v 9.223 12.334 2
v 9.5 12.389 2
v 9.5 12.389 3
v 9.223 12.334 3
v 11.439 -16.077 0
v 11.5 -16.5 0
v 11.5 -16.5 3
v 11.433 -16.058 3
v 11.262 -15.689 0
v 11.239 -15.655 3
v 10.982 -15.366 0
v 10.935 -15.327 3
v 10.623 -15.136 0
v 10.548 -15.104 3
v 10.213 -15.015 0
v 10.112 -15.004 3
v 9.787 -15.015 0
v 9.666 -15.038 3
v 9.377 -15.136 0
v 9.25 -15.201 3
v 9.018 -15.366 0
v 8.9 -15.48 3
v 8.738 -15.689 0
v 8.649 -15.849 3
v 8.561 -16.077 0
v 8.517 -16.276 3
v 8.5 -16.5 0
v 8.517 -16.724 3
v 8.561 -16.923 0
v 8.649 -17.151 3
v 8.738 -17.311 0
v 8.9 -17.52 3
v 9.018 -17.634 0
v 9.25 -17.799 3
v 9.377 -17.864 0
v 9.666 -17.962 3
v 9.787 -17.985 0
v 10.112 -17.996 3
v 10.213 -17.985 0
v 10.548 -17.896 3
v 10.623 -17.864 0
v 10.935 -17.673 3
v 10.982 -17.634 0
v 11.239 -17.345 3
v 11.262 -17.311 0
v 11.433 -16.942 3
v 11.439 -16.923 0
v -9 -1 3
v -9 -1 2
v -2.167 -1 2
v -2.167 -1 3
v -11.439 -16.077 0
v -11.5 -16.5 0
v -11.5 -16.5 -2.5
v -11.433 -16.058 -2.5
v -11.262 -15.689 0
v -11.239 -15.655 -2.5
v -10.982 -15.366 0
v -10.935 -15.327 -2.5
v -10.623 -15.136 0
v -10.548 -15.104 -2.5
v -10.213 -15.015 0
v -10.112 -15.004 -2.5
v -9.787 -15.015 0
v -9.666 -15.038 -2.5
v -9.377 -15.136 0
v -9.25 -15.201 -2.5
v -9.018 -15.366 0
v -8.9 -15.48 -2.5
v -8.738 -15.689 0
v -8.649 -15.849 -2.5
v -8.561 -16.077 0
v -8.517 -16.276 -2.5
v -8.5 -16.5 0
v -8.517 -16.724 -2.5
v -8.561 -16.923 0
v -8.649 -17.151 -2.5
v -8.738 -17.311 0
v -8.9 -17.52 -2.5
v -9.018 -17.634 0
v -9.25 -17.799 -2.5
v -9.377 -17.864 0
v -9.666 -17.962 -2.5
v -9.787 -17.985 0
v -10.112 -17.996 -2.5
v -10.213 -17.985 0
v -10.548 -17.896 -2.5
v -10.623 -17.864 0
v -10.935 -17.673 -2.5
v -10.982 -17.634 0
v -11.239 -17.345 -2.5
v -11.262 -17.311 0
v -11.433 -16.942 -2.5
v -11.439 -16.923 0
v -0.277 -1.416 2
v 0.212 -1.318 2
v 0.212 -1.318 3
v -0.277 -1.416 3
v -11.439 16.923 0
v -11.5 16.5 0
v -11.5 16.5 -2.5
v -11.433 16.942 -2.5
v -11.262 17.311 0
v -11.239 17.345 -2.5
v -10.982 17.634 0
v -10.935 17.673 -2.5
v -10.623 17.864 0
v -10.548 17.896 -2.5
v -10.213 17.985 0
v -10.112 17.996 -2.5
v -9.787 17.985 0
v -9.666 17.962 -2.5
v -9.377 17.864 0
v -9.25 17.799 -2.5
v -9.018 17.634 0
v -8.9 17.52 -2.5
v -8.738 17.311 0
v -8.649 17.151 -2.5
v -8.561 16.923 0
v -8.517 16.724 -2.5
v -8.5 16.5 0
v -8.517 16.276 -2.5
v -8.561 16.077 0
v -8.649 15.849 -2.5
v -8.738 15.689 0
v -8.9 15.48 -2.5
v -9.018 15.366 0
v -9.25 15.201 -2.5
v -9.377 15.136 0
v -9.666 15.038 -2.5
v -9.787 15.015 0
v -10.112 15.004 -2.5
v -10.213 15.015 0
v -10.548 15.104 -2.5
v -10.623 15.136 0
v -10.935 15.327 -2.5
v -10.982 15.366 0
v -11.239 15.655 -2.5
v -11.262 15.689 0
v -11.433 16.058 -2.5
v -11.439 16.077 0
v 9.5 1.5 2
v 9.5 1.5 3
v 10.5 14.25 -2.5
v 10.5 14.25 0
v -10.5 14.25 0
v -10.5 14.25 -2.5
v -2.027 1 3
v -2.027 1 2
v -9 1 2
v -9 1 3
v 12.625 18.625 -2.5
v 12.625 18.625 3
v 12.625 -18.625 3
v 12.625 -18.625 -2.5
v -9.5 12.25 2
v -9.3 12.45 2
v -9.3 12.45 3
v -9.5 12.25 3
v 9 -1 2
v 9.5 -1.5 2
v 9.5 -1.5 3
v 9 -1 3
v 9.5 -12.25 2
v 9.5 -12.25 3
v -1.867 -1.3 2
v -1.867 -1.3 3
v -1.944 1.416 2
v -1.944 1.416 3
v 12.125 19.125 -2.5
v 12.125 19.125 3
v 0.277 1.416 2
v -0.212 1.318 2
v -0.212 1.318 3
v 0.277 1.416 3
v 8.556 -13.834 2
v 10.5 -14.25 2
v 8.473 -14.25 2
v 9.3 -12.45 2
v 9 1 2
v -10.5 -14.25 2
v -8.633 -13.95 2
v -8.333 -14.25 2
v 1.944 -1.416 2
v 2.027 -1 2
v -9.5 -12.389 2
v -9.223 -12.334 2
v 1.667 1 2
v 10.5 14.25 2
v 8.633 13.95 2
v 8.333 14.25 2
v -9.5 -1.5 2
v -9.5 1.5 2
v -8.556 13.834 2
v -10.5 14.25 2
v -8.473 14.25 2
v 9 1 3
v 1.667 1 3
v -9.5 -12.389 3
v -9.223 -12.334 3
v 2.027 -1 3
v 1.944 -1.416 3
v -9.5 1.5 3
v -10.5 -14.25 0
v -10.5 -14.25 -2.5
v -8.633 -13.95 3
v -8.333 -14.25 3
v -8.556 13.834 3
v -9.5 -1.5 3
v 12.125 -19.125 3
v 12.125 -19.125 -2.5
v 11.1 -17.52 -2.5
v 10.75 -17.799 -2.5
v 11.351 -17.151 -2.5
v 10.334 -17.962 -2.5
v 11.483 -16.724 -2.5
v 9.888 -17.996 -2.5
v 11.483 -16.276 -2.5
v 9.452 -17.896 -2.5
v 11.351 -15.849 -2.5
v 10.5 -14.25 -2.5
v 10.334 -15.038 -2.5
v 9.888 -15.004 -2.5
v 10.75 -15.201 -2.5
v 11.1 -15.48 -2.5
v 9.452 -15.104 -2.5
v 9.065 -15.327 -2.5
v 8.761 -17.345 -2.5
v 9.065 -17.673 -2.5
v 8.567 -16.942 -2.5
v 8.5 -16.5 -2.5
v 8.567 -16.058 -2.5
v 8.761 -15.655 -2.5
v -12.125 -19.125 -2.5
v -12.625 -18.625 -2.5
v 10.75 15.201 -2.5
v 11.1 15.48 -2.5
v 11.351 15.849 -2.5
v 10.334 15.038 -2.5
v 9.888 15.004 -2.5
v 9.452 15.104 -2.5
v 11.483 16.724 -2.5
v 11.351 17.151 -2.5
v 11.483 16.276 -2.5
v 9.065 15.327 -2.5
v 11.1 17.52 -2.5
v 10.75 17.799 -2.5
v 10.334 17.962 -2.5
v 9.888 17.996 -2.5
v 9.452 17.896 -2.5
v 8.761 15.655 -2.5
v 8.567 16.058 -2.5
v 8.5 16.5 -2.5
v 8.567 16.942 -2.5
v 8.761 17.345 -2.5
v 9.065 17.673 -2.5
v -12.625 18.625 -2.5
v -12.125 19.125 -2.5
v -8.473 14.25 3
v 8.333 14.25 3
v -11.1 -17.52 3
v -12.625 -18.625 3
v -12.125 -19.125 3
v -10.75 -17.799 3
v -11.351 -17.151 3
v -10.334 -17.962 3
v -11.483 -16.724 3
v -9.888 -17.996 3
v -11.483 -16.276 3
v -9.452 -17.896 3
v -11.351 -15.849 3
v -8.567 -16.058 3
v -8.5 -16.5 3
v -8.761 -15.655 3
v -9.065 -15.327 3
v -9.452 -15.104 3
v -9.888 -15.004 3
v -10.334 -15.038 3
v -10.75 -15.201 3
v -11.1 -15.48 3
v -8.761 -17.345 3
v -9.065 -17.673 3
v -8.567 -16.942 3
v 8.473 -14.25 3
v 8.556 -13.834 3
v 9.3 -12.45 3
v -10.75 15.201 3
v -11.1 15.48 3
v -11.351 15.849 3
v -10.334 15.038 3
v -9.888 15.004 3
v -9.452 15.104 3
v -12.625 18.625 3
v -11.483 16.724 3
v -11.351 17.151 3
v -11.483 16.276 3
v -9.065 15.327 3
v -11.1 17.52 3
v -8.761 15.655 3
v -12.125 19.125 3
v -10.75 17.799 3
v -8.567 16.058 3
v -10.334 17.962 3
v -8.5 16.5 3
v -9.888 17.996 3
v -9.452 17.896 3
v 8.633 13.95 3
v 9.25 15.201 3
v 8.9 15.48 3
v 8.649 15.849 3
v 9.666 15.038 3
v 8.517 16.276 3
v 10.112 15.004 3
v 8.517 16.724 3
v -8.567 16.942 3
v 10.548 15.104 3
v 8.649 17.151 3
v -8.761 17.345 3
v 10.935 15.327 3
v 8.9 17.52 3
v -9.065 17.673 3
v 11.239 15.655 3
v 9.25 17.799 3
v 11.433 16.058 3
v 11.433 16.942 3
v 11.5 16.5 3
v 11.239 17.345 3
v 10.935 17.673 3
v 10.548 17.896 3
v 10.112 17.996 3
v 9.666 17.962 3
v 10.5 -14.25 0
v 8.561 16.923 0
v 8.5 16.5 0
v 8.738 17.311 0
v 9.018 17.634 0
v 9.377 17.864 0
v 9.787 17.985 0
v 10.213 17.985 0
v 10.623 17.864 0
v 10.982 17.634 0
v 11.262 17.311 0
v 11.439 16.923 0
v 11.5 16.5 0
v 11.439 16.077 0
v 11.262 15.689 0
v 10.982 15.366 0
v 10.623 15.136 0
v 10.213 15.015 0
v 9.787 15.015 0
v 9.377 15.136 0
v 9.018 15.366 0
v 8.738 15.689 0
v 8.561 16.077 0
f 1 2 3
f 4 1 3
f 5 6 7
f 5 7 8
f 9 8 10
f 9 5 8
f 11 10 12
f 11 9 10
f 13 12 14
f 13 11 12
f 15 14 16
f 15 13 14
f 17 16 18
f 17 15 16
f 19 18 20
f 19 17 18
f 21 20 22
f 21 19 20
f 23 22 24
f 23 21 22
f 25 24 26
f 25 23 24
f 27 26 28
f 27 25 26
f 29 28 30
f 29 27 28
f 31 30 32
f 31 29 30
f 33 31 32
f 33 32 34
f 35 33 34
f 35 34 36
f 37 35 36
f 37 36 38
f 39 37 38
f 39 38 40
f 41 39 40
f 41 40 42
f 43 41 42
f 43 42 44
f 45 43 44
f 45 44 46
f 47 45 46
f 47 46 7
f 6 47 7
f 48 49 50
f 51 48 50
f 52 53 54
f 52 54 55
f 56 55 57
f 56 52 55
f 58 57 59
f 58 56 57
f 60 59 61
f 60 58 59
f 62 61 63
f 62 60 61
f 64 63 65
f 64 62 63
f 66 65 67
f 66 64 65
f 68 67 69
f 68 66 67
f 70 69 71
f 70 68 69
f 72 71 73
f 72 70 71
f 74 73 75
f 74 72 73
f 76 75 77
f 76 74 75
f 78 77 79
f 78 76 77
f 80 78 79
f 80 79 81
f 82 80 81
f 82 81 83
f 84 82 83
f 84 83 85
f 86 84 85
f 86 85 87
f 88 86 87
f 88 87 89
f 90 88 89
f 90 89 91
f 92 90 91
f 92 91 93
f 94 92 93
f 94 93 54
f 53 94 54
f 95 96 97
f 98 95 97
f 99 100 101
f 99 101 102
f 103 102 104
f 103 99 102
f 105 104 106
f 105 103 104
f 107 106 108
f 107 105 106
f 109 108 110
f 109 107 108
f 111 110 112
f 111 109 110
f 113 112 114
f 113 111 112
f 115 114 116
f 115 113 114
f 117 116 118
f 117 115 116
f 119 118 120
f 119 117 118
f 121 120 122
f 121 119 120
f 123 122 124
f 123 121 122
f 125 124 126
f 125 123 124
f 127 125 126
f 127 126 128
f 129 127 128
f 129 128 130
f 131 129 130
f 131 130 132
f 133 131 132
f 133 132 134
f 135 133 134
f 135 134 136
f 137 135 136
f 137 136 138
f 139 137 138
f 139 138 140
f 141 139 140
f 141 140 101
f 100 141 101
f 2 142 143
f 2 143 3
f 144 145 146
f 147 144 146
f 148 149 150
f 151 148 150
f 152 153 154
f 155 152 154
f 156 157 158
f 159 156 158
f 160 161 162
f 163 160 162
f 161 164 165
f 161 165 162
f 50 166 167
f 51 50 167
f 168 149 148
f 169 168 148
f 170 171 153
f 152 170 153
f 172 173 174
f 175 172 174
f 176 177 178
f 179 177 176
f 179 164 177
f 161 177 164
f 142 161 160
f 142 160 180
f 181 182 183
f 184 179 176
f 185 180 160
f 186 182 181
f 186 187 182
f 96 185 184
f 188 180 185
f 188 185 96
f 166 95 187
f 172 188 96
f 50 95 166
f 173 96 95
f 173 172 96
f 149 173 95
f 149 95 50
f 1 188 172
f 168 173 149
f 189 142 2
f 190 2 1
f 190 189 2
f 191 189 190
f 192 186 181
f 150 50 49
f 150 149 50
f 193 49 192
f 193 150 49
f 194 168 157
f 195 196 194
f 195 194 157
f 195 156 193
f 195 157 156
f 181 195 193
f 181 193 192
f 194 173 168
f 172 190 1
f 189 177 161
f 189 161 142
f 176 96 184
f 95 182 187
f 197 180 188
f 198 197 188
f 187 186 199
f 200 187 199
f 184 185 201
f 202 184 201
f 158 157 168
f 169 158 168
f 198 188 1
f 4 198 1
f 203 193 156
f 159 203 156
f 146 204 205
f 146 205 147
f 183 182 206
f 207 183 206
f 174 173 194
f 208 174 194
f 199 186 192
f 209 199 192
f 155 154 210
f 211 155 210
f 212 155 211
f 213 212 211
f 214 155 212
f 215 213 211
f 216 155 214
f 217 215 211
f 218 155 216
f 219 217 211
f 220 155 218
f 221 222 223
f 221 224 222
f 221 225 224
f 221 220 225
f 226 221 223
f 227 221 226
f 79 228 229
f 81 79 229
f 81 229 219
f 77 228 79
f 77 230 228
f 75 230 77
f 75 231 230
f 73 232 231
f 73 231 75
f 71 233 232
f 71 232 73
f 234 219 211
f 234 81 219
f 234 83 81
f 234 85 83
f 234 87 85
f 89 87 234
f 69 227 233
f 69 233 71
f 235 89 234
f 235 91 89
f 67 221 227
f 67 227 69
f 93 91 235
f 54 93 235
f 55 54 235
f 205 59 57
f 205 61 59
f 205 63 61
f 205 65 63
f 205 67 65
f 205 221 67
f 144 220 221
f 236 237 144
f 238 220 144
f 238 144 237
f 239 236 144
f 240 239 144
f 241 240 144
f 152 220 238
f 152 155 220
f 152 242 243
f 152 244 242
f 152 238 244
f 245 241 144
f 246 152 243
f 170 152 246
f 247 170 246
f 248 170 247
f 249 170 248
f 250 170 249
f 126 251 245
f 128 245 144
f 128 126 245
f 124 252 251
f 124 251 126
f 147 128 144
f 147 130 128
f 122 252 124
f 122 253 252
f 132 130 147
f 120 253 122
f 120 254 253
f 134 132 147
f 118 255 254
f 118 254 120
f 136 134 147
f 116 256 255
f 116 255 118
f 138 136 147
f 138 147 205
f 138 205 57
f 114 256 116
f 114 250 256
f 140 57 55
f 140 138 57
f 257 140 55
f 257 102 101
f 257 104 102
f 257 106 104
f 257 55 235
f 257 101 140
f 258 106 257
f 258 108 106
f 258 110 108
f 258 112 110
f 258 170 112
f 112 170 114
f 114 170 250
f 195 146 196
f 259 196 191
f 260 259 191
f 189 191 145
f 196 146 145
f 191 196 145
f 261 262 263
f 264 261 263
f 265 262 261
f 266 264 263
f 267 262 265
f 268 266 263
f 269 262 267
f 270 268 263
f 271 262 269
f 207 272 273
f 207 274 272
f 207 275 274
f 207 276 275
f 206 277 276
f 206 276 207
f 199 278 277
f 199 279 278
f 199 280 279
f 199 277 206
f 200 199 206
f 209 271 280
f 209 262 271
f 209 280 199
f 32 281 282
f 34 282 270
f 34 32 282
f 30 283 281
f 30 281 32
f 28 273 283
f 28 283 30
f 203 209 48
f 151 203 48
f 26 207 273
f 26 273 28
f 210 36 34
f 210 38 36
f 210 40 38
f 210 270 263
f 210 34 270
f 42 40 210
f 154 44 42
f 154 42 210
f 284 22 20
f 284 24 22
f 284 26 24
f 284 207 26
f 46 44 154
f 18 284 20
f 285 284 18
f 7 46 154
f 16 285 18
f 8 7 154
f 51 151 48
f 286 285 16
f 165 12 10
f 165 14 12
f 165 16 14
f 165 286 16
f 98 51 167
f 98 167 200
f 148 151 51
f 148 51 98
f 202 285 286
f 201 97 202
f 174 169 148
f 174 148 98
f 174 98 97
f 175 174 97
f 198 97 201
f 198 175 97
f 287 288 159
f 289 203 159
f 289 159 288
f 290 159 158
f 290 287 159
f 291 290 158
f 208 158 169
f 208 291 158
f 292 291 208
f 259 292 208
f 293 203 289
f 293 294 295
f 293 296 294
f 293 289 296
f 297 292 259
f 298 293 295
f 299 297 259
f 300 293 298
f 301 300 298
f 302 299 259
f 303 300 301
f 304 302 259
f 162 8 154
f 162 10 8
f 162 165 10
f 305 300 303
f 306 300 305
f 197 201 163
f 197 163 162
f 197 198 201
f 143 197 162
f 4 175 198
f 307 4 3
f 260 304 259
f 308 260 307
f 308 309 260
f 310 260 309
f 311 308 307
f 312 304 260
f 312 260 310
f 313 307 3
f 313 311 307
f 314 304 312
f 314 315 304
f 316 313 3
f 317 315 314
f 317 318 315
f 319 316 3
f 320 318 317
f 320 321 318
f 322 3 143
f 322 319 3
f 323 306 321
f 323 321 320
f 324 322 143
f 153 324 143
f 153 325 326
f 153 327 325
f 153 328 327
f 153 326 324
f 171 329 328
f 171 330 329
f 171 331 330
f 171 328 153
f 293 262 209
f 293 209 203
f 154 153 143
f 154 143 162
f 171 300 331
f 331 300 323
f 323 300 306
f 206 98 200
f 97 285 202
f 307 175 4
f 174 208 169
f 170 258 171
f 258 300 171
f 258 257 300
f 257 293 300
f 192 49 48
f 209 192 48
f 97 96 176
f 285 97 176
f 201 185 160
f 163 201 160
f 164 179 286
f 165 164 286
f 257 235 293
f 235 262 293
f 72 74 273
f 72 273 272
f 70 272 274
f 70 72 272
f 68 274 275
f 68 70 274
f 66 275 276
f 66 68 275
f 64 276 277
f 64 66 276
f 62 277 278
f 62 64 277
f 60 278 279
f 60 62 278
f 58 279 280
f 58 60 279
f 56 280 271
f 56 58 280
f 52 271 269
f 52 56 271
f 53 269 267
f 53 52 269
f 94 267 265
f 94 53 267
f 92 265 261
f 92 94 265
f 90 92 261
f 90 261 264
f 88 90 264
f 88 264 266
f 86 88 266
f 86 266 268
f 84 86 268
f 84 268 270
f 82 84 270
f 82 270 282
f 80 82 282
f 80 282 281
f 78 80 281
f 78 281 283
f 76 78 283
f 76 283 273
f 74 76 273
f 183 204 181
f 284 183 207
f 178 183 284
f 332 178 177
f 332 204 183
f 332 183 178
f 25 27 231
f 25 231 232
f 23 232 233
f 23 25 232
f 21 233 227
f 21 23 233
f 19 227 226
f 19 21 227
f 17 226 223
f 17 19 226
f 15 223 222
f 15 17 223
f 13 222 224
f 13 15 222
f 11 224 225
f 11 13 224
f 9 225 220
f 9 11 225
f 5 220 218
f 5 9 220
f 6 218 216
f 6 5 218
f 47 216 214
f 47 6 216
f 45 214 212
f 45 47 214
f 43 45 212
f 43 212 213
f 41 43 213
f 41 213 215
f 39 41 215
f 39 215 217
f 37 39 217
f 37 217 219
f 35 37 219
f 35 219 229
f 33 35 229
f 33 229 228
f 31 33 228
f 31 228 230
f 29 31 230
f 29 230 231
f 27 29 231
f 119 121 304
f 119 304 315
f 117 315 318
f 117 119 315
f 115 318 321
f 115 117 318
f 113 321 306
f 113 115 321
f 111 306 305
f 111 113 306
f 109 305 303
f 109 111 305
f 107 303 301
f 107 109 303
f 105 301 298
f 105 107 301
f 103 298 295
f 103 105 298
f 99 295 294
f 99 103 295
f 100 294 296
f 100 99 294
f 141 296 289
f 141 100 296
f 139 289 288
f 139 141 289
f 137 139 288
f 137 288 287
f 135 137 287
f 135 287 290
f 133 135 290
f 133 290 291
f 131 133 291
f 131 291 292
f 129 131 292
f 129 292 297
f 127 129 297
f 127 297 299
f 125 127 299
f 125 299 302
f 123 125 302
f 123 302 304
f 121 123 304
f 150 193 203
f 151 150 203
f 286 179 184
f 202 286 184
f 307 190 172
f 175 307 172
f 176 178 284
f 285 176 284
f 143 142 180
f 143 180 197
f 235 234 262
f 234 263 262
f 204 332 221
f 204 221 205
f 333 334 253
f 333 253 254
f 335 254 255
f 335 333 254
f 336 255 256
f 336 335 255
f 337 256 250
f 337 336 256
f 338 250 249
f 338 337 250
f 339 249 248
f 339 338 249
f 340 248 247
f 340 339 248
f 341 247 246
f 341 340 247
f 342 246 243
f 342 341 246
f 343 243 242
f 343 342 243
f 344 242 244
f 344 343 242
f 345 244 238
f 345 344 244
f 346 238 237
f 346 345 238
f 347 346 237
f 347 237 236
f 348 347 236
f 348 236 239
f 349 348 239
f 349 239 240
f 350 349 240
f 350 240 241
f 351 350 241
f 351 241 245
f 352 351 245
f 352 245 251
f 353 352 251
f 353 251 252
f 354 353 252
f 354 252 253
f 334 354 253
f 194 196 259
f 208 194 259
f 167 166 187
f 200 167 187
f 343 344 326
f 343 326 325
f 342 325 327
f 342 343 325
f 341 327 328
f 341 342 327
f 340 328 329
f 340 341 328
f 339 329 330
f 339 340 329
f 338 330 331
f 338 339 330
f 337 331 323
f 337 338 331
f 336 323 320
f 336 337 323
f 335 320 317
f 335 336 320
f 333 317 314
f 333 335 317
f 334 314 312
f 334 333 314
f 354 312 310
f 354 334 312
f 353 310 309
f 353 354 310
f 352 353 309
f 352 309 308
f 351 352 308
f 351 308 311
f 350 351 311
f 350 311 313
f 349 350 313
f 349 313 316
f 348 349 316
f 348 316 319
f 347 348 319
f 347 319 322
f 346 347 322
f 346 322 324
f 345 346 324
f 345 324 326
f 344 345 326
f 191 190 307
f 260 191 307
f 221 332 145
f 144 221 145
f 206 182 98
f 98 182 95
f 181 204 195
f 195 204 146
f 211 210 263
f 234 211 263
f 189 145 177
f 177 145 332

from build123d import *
from OCP.BRepFilletAPI import BRepFilletAPI_MakeChamfer

# Parameters (mm, degrees)
SKETCH2_W           = 25.25
SKETCH2_H           = 38.25
SKETCH2_R           = 1.5
SKETCH2_W_2         = 19
SKETCH2_H_2         = 28.5
SKETCH2_R_2         = 1
BOSS_EXTRUDE1_DEPTH = 3
CHAMFER1_SIZE       = 0.5
CHAMFER1_SIZE2      = 0.360555128
CHAMFER1_SIZE2_2    = 0.382352941
CUT_EXTRUDE1_DEPTH  = 2
SKETCH5_R           = 1.5
SKETCH5_W           = 21
SKETCH5_H           = 28.5
BOSS_EXTRUDE2_DEPTH = 2.5


with BuildPart() as part:
    # Sketch2 → Boss-Extrude1 (new body)
    with BuildSketch(Plane.XY):
        Rectangle(SKETCH2_W, SKETCH2_H)
        with Locations((-10, -16.5)):
            Circle(SKETCH2_R, mode=Mode.SUBTRACT)
        with Locations((10, -16.5)):
            Circle(SKETCH2_R, mode=Mode.SUBTRACT)
        with Locations((10, 16.5)):
            Circle(SKETCH2_R, mode=Mode.SUBTRACT)
        with Locations((-10, 16.5)):
            Circle(SKETCH2_R, mode=Mode.SUBTRACT)
        Rectangle(SKETCH2_W_2, SKETCH2_H_2, mode=Mode.SUBTRACT)
        Polygon((-1.666666667, -1), (-1, 0), (-1.666666667, 1), (-9.5, 1), (-9.5, -1), align=None)
        with BuildLine():
            Line((-9.5, -14.25), (-8.833333333, -14.25))
            Line((-8.833333333, -14.25), (0, -1))
            ThreePointArc((0, -1), (-0.707106781, -0.707106781), (-1, 0))
            Line((-1, 0), (-1.666666667, -1))
            Line((-1.666666667, -1), (-9.5, -12.75))
            Line((-9.5, -12.75), (-9.5, -14.25))
        make_face()
        with BuildLine():
            Line((8.833333333, -14.25), (9.5, -14.25))
            Line((9.5, -14.25), (9.5, -12.75))
            Line((9.5, -12.75), (1.666666667, -1))
            Line((1.666666667, -1), (1, 0))
            ThreePointArc((1, 0), (0.707106781, -0.707106781), (0, -1))
            Line((0, -1), (8.833333333, -14.25))
        make_face()
        Polygon((1.666666667, -1), (9.5, -1), (9.5, 1), (1.666666667, 1), (1, 0), align=None)
        with BuildLine():
            ThreePointArc((0, 1), (0.707106781, 0.707106781), (1, 0))
            Line((1, 0), (1.666666667, 1))
            Line((1.666666667, 1), (9.5, 12.75))
            Line((9.5, 12.75), (9.5, 14.25))
            Line((9.5, 14.25), (8.833333333, 14.25))
            Line((8.833333333, 14.25), (0, 1))
        make_face()
        Circle(SKETCH2_R_2)
        with BuildLine():
            Line((-1.666666667, 1), (-1, 0))
            ThreePointArc((-1, 0), (-0.707106781, 0.707106781), (0, 1))
            Line((0, 1), (-8.833333333, 14.25))
            Line((-8.833333333, 14.25), (-9.5, 14.25))
            Line((-9.5, 14.25), (-9.5, 12.75))
            Line((-9.5, 12.75), (-1.666666667, 1))
        make_face()
    extrude(amount=BOSS_EXTRUDE1_DEPTH)

    # Chamfer1: one chamfer whose edges measure the first distance from different faces: ONE call of the kernel's chamfer builder (chamfer() names one face for all edges)
    chamfer1_edges_1 = [part.edges().sort_by_distance(p)[0] for p in [
        (-12.625, 19.125, 1.5),
        (12.625, 19.125, 1.5),
        (12.625, -19.125, 1.5),
        (-12.625, -19.125, 1.5),
        (-9.5, 1, 1.5),
        (-9.5, -1, 1.5),
        (9.5, -1, 1.5),
        (9.5, 1, 1.5),
    ]]
    chamfer1_edges_2 = [part.edges().sort_by_distance(p)[0] for p in [
        (-1.666666667, 1, 1.5),
    ]]
    chamfer1_side_2 = [part.faces().sort_by_distance(p)[0] for p in [
        (-5.583333333, 6.875, 1.5),
    ]]
    chamfer1_edges_3 = [part.edges().sort_by_distance(p)[0] for p in [
        (-9.5, 12.75, 1.5),
    ]]
    chamfer1_side_3 = [part.faces().sort_by_distance(p)[0] for p in [
        (-9.5, 6.875, 1.5),
    ]]
    chamfer1_edges_4 = [part.edges().sort_by_distance(p)[0] for p in [
        (-1.666666667, -1, 1.5),
    ]]
    chamfer1_side_4 = [part.faces().sort_by_distance(p)[0] for p in [
        (-5.583333333, -1, 1.5),
    ]]
    chamfer1_edges_5 = [part.edges().sort_by_distance(p)[0] for p in [
        (-9.5, -12.75, 1.5),
    ]]
    chamfer1_side_5 = [part.faces().sort_by_distance(p)[0] for p in [
        (-5.583333333, -6.875, 1.5),
    ]]
    chamfer1_edges_6 = [part.edges().sort_by_distance(p)[0] for p in [
        (8.833333333, 14.25, 1.5),
    ]]
    chamfer1_side_6 = [part.faces().sort_by_distance(p)[0] for p in [
        (0, 14.25, 1.5),
    ]]
    chamfer1_edges_7 = [part.edges().sort_by_distance(p)[0] for p in [
        (-8.833333333, 14.25, 1.5),
    ]]
    chamfer1_side_7 = [part.faces().sort_by_distance(p)[0] for p in [
        (-4.416666667, 7.625, 1.5),
    ]]
    chamfer1_edges_8 = [part.edges().sort_by_distance(p)[0] for p in [
        (0, 1, 1.5),
    ]]
    chamfer1_side_8 = [part.faces().sort_by_distance(p)[0] for p in [
        (4.416666667, 7.625, 1.5),
    ]]
    chamfer1_edges_9 = [part.edges().sort_by_distance(p)[0] for p in [
        (9.5, -12.75, 1.5),
    ]]
    chamfer1_side_9 = [part.faces().sort_by_distance(p)[0] for p in [
        (9.5, -6.875, 1.5),
    ]]
    chamfer1_edges_10 = [part.edges().sort_by_distance(p)[0] for p in [
        (1.666666667, -1, 1.5),
    ]]
    chamfer1_side_10 = [part.faces().sort_by_distance(p)[0] for p in [
        (5.583333333, -6.875, 1.5),
    ]]
    chamfer1_edges_11 = [part.edges().sort_by_distance(p)[0] for p in [
        (-8.833333333, -14.25, 1.5),
    ]]
    chamfer1_side_11 = [part.faces().sort_by_distance(p)[0] for p in [
        (0, -14.25, 1.5),
    ]]
    chamfer1_edges_12 = [part.edges().sort_by_distance(p)[0] for p in [
        (8.833333333, -14.25, 1.5),
    ]]
    chamfer1_side_12 = [part.faces().sort_by_distance(p)[0] for p in [
        (4.416666667, -7.625, 1.5),
    ]]
    chamfer1_edges_13 = [part.edges().sort_by_distance(p)[0] for p in [
        (0, -1, 1.5),
    ]]
    chamfer1_side_13 = [part.faces().sort_by_distance(p)[0] for p in [
        (-4.416666667, -7.625, 1.5),
    ]]
    chamfer1_edges_14 = [part.edges().sort_by_distance(p)[0] for p in [
        (9.5, 12.75, 1.5),
    ]]
    chamfer1_side_14 = [part.faces().sort_by_distance(p)[0] for p in [
        (5.583333333, 6.875, 1.5),
    ]]
    chamfer1 = BRepFilletAPI_MakeChamfer(part.part.solid().wrapped)
    for e in chamfer1_edges_1:
        chamfer1.Add(CHAMFER1_SIZE, e.wrapped)
    for e in chamfer1_edges_2:
        chamfer1.Add(CHAMFER1_SIZE, CHAMFER1_SIZE2, e.wrapped, chamfer1_side_2[0].wrapped)  # the first distance lies on this face
    for e in chamfer1_edges_3:
        chamfer1.Add(CHAMFER1_SIZE, CHAMFER1_SIZE2, e.wrapped, chamfer1_side_3[0].wrapped)  # the first distance lies on this face
    for e in chamfer1_edges_4:
        chamfer1.Add(CHAMFER1_SIZE, CHAMFER1_SIZE2, e.wrapped, chamfer1_side_4[0].wrapped)  # the first distance lies on this face
    for e in chamfer1_edges_5:
        chamfer1.Add(CHAMFER1_SIZE, CHAMFER1_SIZE2, e.wrapped, chamfer1_side_5[0].wrapped)  # the first distance lies on this face
    for e in chamfer1_edges_6:
        chamfer1.Add(CHAMFER1_SIZE, CHAMFER1_SIZE2, e.wrapped, chamfer1_side_6[0].wrapped)  # the first distance lies on this face
    for e in chamfer1_edges_7:
        chamfer1.Add(CHAMFER1_SIZE, CHAMFER1_SIZE2, e.wrapped, chamfer1_side_7[0].wrapped)  # the first distance lies on this face
    for e in chamfer1_edges_8:
        chamfer1.Add(CHAMFER1_SIZE, CHAMFER1_SIZE2_2, e.wrapped, chamfer1_side_8[0].wrapped)  # the first distance lies on this face
    for e in chamfer1_edges_9:
        chamfer1.Add(CHAMFER1_SIZE, CHAMFER1_SIZE2, e.wrapped, chamfer1_side_9[0].wrapped)  # the first distance lies on this face
    for e in chamfer1_edges_10:
        chamfer1.Add(CHAMFER1_SIZE, CHAMFER1_SIZE2, e.wrapped, chamfer1_side_10[0].wrapped)  # the first distance lies on this face
    for e in chamfer1_edges_11:
        chamfer1.Add(CHAMFER1_SIZE, CHAMFER1_SIZE2, e.wrapped, chamfer1_side_11[0].wrapped)  # the first distance lies on this face
    for e in chamfer1_edges_12:
        chamfer1.Add(CHAMFER1_SIZE, CHAMFER1_SIZE2, e.wrapped, chamfer1_side_12[0].wrapped)  # the first distance lies on this face
    for e in chamfer1_edges_13:
        chamfer1.Add(CHAMFER1_SIZE, CHAMFER1_SIZE2_2, e.wrapped, chamfer1_side_13[0].wrapped)  # the first distance lies on this face
    for e in chamfer1_edges_14:
        chamfer1.Add(CHAMFER1_SIZE, CHAMFER1_SIZE2, e.wrapped, chamfer1_side_14[0].wrapped)  # the first distance lies on this face
    add(Compound.cast(chamfer1.Shape()), mode=Mode.REPLACE)

    # Sketch3 → Cut-Extrude1 (cut)
    with BuildSketch(Plane(origin=(0, 0, 0), x_dir=(-1, 0, 0), z_dir=(0, 0, -1))):
        Polygon((10.5, -14.25), (10.5, 14.25), (8.472778206, 14.25), (8.555983235, 13.833974853), (0.212091251, 1.318136877), (-0.277350098, 1.416025147), (-8.633333333, 13.95), (-8.333333333, 14.25), (-10.5, 14.25), (-10.5, -14.25), (-8.472778206, -14.25), (-8.555983235, -13.833974853), (-0.212091251, -1.318136877), (0.277350098, -1.416025147), (8.633333333, -13.95), (8.333333333, -14.25), align=None)
        Polygon((-1.666666667, 1), (-9, 1), (-9.5, 1.5), (-9.5, 12.389444872), (-9.222649902, 12.333974853), align=None, mode=Mode.SUBTRACT)
        Polygon((-9.5, -1.5), (-9, -1), (-2.027221794, -1), (-1.944016765, -1.416025147), (-9.3, -12.45), (-9.5, -12.25), align=None, mode=Mode.SUBTRACT)
        Polygon((9.5, 1.5), (9, 1), (2.027221794, 1), (1.944016765, 1.416025147), (9.3, 12.45), (9.5, 12.25), align=None, mode=Mode.SUBTRACT)
        Polygon((9.222649902, -12.333974853), (1.866666667, -1.3), (2.166666667, -1), (9, -1), (9.5, -1.5), (9.5, -12.389444872), align=None, mode=Mode.SUBTRACT)
    extrude(amount=-CUT_EXTRUDE1_DEPTH, mode=Mode.SUBTRACT)

    # Sketch5 → Boss-Extrude2 (add)
    with BuildSketch(Plane(origin=(0, 0, 0), x_dir=(-1, 0, 0), z_dir=(0, 0, -1))):
        Polygon((-12.125, -19.125), (12.125, -19.125), (12.625, -18.625), (12.625, 18.625), (12.125, 19.125), (-12.125, 19.125), (-12.625, 18.625), (-12.625, -18.625), align=None)
        with Locations((-10, -16.5)):
            Circle(SKETCH5_R, mode=Mode.SUBTRACT)
        with Locations((10, -16.5)):
            Circle(SKETCH5_R, mode=Mode.SUBTRACT)
        with Locations((10, 16.5)):
            Circle(SKETCH5_R, mode=Mode.SUBTRACT)
        with Locations((-10, 16.5)):
            Circle(SKETCH5_R, mode=Mode.SUBTRACT)
        Rectangle(SKETCH5_W, SKETCH5_H, mode=Mode.SUBTRACT)
    extrude(amount=BOSS_EXTRUDE2_DEPTH)


solid = part.part
